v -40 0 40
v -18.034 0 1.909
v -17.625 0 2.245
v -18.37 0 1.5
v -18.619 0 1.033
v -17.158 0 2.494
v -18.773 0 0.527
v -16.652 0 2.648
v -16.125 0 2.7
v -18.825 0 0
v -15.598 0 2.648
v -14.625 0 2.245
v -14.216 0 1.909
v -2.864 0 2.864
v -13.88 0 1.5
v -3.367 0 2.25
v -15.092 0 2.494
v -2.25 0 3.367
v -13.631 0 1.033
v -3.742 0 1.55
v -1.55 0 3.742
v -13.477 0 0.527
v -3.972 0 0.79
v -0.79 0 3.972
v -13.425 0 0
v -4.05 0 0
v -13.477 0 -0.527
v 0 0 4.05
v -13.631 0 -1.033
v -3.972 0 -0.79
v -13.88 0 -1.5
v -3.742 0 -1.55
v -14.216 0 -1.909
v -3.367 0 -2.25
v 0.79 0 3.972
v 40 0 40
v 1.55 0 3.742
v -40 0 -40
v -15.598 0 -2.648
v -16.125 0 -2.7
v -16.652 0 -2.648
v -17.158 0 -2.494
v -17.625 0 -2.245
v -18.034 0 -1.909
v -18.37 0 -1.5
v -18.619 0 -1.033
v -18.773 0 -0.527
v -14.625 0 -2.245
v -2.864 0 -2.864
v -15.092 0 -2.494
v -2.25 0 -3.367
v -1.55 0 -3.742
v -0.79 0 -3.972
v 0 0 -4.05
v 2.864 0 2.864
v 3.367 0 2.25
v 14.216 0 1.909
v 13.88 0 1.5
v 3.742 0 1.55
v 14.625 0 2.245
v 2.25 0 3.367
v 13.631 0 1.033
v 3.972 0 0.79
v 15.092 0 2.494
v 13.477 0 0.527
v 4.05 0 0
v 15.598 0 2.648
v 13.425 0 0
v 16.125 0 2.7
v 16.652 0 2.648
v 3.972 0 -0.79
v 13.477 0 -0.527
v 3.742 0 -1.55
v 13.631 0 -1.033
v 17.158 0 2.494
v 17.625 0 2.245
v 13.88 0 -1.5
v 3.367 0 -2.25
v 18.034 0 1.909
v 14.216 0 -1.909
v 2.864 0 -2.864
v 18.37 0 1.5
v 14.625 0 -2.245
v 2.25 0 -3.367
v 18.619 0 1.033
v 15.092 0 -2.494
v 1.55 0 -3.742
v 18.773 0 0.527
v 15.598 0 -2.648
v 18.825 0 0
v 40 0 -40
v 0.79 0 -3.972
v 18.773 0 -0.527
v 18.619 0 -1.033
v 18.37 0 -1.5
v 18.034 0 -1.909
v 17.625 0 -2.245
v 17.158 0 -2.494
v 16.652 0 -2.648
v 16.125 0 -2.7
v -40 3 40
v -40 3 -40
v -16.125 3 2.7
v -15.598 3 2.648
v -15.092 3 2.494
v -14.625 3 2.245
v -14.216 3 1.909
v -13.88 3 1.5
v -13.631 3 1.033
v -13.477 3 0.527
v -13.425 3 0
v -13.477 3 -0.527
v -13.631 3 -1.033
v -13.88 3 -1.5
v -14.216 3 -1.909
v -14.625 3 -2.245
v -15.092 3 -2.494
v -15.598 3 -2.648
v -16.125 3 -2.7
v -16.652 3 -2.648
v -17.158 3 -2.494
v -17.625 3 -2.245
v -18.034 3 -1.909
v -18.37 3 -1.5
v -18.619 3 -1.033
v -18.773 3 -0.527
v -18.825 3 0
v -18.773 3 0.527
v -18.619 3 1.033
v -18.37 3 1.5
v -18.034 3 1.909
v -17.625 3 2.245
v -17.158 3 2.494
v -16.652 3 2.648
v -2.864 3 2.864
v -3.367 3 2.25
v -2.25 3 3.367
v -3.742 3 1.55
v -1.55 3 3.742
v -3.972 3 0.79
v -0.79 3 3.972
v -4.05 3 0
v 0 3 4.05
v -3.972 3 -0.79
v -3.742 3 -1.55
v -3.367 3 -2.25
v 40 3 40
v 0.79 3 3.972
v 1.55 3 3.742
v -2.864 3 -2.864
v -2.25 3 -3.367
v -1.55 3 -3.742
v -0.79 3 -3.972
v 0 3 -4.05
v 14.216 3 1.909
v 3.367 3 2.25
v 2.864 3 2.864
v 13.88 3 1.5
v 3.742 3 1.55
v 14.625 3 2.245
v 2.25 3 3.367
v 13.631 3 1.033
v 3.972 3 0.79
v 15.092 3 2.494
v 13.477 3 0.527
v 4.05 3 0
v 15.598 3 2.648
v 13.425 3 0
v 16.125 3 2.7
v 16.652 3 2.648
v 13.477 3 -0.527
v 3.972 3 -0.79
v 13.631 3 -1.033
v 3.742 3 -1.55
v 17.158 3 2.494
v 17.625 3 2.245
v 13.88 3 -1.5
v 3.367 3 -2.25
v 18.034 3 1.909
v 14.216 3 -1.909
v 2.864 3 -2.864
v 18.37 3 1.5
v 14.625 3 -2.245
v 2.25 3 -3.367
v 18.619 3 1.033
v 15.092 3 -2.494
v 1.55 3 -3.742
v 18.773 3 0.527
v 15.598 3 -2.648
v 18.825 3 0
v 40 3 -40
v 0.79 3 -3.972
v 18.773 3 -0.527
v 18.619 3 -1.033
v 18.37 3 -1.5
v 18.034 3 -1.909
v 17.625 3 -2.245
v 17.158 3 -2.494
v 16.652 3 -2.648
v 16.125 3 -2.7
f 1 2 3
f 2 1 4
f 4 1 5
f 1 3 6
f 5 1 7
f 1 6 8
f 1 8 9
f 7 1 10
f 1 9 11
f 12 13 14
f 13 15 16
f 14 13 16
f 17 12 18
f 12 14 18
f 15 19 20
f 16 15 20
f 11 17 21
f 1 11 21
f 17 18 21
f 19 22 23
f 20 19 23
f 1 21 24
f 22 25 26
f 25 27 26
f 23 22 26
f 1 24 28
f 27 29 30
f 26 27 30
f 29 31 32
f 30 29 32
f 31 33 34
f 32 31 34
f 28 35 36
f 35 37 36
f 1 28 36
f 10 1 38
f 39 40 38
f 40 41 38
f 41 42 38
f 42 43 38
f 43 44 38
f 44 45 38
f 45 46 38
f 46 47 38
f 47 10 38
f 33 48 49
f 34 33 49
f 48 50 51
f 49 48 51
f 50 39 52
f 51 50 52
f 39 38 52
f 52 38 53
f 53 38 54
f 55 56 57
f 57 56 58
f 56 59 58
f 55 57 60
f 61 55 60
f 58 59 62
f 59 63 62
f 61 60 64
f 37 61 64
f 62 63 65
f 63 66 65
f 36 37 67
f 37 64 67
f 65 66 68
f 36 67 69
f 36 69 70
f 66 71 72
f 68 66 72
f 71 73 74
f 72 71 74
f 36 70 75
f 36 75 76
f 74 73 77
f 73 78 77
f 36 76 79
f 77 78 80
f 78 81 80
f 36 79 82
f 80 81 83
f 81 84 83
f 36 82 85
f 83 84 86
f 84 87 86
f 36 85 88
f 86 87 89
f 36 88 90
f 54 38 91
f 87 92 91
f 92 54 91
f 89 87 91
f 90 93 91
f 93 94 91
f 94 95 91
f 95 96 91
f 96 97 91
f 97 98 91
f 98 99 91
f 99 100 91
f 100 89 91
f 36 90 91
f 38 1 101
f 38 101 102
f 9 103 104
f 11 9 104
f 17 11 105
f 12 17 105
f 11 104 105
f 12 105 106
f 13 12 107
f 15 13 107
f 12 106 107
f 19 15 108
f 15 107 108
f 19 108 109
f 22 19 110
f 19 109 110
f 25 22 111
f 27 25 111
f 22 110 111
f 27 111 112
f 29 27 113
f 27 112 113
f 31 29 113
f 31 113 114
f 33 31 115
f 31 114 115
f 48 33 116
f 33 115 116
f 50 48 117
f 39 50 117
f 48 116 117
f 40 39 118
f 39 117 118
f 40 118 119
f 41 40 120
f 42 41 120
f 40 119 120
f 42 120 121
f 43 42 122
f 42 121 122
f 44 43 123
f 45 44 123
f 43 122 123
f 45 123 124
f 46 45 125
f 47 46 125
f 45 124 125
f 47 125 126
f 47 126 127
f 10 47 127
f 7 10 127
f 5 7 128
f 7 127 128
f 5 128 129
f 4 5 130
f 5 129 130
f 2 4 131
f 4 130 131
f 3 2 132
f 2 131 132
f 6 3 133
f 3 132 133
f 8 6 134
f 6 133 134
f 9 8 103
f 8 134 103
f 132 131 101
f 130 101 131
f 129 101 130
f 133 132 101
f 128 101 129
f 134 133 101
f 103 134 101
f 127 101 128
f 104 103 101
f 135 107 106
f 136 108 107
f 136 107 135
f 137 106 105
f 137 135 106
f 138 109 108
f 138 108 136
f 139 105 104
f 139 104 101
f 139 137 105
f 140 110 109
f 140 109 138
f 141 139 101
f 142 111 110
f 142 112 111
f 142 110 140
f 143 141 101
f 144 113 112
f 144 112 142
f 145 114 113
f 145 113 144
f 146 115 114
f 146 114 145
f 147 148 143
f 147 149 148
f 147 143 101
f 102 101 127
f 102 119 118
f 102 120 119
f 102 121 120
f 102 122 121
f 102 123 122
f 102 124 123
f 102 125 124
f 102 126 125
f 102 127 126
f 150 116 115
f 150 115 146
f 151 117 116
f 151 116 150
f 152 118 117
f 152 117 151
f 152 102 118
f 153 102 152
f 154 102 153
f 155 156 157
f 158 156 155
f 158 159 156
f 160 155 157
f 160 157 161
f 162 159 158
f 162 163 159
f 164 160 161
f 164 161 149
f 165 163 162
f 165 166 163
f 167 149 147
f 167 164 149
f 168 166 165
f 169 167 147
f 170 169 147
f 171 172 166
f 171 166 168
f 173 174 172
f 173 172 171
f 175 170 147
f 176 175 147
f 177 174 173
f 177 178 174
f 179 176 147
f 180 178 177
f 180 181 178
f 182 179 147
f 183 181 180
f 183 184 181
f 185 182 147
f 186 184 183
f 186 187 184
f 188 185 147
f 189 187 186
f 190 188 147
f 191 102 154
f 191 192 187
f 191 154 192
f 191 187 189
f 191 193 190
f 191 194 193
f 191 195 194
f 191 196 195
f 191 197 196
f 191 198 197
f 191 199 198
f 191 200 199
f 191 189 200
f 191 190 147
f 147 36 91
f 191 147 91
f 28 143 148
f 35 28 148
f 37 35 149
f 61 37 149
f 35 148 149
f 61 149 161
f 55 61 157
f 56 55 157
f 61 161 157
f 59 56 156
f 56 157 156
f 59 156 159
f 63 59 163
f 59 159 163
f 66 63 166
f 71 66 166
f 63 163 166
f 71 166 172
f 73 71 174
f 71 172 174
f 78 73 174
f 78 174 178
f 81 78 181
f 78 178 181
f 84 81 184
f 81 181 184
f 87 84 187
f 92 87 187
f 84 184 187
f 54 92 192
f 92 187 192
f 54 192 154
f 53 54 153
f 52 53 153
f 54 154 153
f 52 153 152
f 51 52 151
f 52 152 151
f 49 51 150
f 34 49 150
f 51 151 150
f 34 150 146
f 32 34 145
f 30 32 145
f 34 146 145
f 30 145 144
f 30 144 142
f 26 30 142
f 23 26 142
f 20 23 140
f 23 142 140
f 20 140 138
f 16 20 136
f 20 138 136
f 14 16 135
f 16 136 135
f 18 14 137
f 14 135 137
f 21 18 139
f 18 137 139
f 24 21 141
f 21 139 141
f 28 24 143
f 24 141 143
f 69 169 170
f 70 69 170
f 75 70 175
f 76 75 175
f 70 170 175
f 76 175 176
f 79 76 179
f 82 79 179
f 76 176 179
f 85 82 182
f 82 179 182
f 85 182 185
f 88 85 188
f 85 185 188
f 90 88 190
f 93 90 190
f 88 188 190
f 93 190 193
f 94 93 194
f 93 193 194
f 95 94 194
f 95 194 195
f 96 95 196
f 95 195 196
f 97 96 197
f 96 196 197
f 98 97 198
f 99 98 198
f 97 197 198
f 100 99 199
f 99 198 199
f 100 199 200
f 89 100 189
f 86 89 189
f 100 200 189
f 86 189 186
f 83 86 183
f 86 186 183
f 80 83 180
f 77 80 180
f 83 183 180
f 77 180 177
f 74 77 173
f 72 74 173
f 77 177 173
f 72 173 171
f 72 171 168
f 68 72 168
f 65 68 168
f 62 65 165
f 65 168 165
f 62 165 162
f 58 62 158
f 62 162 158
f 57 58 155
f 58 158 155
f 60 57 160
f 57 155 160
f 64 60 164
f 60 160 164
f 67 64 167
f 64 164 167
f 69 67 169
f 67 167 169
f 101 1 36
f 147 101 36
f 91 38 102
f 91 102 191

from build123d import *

# Parameters (mm, degrees)
SKETCH_1_W          = 80
SKETCH_1_H          = 80
EXTRUDE_1_DEPTH     = 3
SKETCH_2_R          = 4.05
CUT_EXTRUDE_1_DEPTH = 3
SKETCH_3_R          = 2.7
CUT_EXTRUDE_2_DEPTH = 3


with BuildPart() as part:
    # 草图1 → 凸台-拉伸1 (new body)
    with BuildSketch(Plane(origin=(0, 0, 0), x_dir=(1, 0, 0), z_dir=(0, 1, 0))):
        Rectangle(SKETCH_1_W, SKETCH_1_H)
    extrude(amount=EXTRUDE_1_DEPTH)

    # 草图2 → 切除-拉伸1 (cut)
    with BuildSketch(Plane(origin=(0, 3, 0), x_dir=(1, 0, 0), z_dir=(0, 1, 0))):
        with Locations(Location((0, 0, 0), (0, 0, 270))):
            Circle(SKETCH_2_R)
    extrude(amount=-CUT_EXTRUDE_1_DEPTH, mode=Mode.SUBTRACT)

    # 草图3 → 切除-拉伸2 (cut)
    with BuildSketch(Plane(origin=(0, 3, 0), x_dir=(1, 0, 0), z_dir=(0, 1, 0))):
        with Locations(Location((16.125, 0, 0), (0, 0, 270))):
            Circle(SKETCH_3_R)
        with Locations(Location((-16.125, 0, 0), (0, 0, 270))):
            Circle(SKETCH_3_R)
    extrude(amount=-CUT_EXTRUDE_2_DEPTH, mode=Mode.SUBTRACT)


solid = part.part
